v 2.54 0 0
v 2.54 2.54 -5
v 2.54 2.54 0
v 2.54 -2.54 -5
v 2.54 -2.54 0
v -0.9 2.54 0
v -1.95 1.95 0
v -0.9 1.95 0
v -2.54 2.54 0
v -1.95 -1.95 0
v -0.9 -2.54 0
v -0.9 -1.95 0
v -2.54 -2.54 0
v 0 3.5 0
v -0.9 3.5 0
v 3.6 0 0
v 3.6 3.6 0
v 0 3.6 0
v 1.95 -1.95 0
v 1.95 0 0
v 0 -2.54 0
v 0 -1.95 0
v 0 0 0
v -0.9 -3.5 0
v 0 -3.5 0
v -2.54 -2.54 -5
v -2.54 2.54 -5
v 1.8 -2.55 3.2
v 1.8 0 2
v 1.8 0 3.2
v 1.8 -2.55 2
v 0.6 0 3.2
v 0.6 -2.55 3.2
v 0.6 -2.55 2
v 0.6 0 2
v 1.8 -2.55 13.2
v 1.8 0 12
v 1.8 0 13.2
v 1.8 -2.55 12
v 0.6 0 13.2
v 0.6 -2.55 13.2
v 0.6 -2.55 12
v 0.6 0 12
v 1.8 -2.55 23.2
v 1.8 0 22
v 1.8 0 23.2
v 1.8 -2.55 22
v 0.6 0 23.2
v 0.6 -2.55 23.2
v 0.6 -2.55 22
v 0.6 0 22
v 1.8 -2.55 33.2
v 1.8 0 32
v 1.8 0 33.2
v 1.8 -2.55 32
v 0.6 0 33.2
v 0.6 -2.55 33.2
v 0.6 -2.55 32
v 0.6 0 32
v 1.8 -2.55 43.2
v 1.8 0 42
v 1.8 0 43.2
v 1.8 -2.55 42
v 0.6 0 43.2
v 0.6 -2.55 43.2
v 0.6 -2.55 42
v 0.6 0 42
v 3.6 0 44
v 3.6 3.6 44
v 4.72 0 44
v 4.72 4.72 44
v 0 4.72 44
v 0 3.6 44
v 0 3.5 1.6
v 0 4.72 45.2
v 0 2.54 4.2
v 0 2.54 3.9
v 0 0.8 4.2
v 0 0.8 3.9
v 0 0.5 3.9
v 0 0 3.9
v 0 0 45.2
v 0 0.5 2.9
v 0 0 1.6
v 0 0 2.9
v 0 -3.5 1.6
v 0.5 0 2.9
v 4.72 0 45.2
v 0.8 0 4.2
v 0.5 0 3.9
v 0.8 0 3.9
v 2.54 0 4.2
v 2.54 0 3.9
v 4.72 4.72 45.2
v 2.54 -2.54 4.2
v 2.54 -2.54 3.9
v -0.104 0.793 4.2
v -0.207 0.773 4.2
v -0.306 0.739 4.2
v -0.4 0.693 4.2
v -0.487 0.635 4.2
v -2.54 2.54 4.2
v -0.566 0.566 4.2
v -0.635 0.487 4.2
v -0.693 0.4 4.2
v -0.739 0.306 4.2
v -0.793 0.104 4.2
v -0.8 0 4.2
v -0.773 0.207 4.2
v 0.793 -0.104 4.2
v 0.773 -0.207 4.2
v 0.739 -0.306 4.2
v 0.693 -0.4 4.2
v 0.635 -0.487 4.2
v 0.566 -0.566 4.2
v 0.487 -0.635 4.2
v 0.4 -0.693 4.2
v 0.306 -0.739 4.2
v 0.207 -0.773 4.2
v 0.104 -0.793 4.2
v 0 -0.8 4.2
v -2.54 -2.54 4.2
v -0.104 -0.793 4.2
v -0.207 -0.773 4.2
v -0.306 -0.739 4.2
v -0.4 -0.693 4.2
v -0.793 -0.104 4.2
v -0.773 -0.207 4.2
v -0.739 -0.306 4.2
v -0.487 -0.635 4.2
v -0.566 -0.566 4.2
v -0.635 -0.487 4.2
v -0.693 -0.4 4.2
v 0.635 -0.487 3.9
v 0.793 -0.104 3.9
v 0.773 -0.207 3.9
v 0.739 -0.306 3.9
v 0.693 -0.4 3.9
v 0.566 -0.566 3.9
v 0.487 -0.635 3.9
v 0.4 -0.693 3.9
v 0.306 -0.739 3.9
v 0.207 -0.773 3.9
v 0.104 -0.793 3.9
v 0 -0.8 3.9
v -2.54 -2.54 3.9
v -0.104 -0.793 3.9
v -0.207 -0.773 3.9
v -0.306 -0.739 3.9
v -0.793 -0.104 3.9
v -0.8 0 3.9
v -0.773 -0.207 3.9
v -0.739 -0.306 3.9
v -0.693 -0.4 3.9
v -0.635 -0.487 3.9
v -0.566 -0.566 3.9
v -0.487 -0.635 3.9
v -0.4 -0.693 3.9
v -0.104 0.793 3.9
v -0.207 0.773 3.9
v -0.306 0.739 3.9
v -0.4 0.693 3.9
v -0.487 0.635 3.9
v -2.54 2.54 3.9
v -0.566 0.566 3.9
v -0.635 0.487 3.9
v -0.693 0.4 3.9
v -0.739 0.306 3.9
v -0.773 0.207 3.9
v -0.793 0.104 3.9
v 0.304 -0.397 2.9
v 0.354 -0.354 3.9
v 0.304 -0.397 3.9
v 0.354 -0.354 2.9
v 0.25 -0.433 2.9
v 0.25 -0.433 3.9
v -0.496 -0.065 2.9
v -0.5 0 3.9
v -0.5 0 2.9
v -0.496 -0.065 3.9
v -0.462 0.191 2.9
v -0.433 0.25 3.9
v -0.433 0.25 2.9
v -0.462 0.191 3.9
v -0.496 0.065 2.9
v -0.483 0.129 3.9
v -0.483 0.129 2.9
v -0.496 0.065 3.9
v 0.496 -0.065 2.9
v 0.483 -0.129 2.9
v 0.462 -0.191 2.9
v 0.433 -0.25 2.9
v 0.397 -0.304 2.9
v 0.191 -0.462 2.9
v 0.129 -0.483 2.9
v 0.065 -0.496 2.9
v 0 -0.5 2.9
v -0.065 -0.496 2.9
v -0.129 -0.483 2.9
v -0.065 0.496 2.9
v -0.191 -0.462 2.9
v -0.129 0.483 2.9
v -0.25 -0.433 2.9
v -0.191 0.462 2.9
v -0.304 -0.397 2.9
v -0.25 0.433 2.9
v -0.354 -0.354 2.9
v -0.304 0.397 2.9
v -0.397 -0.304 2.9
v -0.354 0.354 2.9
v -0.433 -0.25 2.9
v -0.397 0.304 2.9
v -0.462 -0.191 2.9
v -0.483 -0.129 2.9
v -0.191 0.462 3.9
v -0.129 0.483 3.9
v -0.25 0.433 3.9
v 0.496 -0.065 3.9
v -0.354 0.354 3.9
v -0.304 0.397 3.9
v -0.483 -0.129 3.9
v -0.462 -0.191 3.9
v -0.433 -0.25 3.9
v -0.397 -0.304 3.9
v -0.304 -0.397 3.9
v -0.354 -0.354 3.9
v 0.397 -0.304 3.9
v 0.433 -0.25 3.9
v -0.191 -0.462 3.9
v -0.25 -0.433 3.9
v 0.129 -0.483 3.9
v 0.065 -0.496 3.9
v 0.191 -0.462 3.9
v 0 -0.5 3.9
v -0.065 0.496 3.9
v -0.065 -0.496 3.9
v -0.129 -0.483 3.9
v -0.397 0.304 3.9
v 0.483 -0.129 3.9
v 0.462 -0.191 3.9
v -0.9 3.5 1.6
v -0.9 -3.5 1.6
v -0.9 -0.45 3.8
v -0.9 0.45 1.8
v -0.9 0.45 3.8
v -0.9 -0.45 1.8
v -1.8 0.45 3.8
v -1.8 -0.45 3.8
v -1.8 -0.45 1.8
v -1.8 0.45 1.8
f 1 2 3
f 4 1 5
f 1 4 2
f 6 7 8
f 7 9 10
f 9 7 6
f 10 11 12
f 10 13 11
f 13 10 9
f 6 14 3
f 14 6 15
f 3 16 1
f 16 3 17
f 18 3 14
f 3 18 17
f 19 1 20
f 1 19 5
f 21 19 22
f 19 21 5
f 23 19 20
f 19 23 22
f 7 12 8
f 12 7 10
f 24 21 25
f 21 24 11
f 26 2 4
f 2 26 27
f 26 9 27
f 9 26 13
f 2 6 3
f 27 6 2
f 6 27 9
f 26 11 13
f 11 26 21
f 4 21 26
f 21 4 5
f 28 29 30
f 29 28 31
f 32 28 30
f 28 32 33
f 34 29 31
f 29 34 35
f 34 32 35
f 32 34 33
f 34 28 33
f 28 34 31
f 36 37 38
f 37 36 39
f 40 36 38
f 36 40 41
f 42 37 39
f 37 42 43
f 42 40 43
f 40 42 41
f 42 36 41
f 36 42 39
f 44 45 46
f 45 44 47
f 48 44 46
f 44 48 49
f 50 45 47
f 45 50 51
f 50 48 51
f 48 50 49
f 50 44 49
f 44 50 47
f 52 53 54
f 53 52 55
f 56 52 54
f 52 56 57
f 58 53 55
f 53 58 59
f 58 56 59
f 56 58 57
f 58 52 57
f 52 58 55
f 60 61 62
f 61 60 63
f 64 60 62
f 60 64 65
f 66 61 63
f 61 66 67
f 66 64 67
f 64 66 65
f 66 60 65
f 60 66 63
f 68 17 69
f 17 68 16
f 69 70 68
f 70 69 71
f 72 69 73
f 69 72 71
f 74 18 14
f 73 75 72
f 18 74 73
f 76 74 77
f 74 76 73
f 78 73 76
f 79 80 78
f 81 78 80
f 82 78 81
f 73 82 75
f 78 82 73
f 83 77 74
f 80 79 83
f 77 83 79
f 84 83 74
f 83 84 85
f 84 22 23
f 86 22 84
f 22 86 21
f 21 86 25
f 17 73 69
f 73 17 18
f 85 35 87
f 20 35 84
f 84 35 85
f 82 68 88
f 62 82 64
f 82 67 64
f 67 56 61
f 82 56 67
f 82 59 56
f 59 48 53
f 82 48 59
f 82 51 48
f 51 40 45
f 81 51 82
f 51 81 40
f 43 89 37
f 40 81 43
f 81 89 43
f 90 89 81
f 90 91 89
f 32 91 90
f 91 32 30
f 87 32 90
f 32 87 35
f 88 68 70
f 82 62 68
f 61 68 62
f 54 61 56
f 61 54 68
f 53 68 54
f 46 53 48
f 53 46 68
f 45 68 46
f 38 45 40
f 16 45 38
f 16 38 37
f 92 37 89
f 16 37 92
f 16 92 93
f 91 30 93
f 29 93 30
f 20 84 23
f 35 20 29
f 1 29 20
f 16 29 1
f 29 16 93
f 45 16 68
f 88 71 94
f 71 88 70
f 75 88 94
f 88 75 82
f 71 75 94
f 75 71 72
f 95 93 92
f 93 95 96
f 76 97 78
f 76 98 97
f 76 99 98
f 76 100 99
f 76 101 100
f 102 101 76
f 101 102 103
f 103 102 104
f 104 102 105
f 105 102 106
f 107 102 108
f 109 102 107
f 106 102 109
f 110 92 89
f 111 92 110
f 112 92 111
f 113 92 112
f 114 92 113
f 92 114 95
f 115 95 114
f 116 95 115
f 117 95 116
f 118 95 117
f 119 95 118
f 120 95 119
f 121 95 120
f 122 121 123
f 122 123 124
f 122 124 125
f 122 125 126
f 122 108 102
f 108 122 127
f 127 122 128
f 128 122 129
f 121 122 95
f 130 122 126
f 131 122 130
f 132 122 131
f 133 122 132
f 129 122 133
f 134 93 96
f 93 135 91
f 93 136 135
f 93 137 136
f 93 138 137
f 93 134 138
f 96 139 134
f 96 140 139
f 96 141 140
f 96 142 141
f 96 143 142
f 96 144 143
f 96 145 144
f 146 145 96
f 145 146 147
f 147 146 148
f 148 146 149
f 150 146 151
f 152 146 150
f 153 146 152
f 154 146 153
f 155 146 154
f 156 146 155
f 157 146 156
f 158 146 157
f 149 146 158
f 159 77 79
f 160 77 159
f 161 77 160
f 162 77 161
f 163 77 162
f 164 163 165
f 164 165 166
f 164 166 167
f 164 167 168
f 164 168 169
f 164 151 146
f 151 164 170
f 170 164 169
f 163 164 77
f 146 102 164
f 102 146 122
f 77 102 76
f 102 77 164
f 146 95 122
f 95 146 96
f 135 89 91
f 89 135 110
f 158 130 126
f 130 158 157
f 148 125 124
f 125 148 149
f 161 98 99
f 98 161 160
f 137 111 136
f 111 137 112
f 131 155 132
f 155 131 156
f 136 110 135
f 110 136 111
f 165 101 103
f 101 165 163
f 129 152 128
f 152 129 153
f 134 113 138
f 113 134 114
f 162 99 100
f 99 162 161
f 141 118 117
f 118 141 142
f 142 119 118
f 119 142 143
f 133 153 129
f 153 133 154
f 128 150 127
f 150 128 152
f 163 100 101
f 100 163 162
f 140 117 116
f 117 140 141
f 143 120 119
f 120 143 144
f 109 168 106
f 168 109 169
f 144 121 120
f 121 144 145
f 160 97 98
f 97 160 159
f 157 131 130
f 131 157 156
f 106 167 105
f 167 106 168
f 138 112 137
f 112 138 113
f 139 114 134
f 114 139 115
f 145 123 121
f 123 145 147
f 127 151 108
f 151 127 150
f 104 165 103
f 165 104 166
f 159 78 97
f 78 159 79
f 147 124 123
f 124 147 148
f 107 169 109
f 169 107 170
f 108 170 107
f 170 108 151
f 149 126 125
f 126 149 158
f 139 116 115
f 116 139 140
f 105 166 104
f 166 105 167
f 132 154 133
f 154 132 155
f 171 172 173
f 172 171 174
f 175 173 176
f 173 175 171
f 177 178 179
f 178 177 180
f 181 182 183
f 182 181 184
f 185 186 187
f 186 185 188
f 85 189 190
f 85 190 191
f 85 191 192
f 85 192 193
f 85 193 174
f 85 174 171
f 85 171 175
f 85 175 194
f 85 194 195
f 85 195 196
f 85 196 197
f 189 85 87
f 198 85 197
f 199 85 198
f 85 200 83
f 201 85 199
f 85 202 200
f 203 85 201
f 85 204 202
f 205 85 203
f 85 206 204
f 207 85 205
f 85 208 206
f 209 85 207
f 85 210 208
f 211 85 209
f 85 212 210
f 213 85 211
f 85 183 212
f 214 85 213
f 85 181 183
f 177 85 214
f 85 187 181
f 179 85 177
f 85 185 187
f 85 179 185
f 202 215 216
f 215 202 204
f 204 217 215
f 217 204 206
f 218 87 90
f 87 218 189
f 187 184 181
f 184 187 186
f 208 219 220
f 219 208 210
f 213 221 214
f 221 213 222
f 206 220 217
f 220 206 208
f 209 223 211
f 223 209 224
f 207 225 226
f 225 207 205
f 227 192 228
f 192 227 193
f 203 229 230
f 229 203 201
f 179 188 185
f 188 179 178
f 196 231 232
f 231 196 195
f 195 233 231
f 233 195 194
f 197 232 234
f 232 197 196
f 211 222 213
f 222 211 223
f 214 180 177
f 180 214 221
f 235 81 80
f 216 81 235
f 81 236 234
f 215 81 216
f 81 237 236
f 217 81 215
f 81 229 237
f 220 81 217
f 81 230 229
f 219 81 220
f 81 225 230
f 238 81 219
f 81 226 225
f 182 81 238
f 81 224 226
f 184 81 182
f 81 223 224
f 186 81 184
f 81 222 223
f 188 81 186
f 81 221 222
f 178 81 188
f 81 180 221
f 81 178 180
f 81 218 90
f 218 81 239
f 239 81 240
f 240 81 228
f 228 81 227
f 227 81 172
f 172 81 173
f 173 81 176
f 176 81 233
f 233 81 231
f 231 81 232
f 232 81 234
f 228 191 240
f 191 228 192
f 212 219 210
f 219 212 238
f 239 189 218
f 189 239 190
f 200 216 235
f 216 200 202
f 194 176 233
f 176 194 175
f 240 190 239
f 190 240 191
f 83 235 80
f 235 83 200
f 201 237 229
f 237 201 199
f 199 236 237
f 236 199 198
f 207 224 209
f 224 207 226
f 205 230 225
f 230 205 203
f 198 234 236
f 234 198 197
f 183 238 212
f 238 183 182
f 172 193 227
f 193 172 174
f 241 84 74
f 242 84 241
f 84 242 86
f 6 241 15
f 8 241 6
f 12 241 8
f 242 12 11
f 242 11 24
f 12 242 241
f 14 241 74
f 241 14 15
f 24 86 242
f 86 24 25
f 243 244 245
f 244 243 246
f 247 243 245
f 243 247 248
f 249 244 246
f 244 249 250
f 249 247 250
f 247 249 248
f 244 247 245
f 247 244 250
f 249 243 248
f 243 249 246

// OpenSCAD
// DND-75 A2 / A3 divergent machines -- punched-media true-pitch cell CAD.
//
// A2 (hand-crank + punched-tape reader) and A3 (S1-B banked broadcast ratchet +
// punched-film threshold planes) share ONE new geometric claim that must be
// witnessed at the real 5.08 mm pitch: a punched MEDIA bit (a hole in a thin
// film/tape) must be able to open or block a printed gate beside a 4.72 mm
// column, with printable walls, and a follower must pass the hole.
//
// This file models that media cell: the column + 5-pocket rack, the printed
// gate bar, and the punched film with its hole and its boss (the A2 read-comb
// follower or the A3 threshold-plane boss). It is the pitch-budget witness for
// the whole punched-media family, deliberately kept to the S5 column so the
// only NEW parts are the film plane and the gate.
//
// EVIDENCE CLASS: CAD (this file + its STL render). Not a print, not a
// measurement. See 07-evidence-and-decisions/dnd75-divergent-low-cost.md.
// Units: mm. Target process: Bambu X1C, PLA, 0.4 mm nozzle.

PITCH = 5.08;
LEVELS = 5;
TRAVEL = 40.0;

// unchanged visible column (test11 S1 coupon conventions)
COLUMN_CAP = 4.72;
COLUMN_BODY = 3.60;
RACK_PITCH = 10.0;
RACK_POCKETS = 5;
POCKET_DEPTH = 1.20;
POCKET_WIDTH = 2.40;

// printed gate bar (S1 coupon geometry: stacked ABOVE the pawl in Z).
// DND-75 hostile fix: the test11 S1 coupon used 0.80 mm leaves, which sit
// between the 1-line floor (0.44) and the 2-line robustness target (0.88).
// A2/A3 re-profile both to 0.90 mm (2 lines) so the printed leaves PASS.
PAWL_T = 0.90;
PAWL_W = 7.00;
PAWL_L = 1.60;
GATE_BAR_T = 0.90;
GATE_TRAVEL = 1.40;

// punched media
FILM_T = 0.30;                  // punched film/tape thickness (1 line = 0.44;
                                // declared 0.30 is BELOW the floor -> the
                                // validator must flag it RISK, which is the
                                // honest A2/A3 media risk to record)
HOLE_D = 1.60;                  // media hole diameter
BOSS_D = 1.00;                  // film boss over an armed cell
MEDIA_W = PITCH;

// printed guide sleeves / housing
WALL = 0.90;
BASE = 3.00;
MIN_FDM_WALL = 0.44;

$fn = 48;
EPS = 0.01;

module column() {
    // necked body + square visible cap
    translate([0, 0, 0]) cube([COLUMN_BODY, COLUMN_BODY, TRAVEL + 4.0], center = false);
    translate([0, 0, TRAVEL + 4.0])
        cube([COLUMN_CAP, COLUMN_CAP, 1.2], center = false);
    // 5-pocket rack on one face
    for (k = [0:RACK_POCKETS - 1])
        translate([COLUMN_BODY / 2 - POCKET_DEPTH, -PITCH / 2 - EPS,
                   k * RACK_PITCH + 2.0])
            cube([POCKET_DEPTH, PITCH + 2 * EPS, 1.2]);
}

module pawl() {
    // flat cantilever rooted on the frame, wedge toe into a rack pocket
    translate([-PAWL_T, -PAWL_W / 2, 0]) cube([PAWL_T, PAWL_W, PAWL_L]);
}

module gate_bar() {
    // vertical gate bar, stacked above the pawl in the same X/Y lane
    translate([-PAWL_T - GATE_BAR_T, -GATE_BAR_T / 2, PAWL_L + 0.2])
        cube([GATE_BAR_T, GATE_BAR_T, 2.0]);
}

module punched_film() {
    // the media plane with one hole and one boss (armed cell)
    difference() {
        translate([-MEDIA_W / 2, -MEDIA_W / 2, -FILM_T])
            cube([MEDIA_W, MEDIA_W, FILM_T]);
        translate([0, 0, -FILM_T - EPS]) cylinder(r = HOLE_D / 2, h = FILM_T + 2 * EPS);
    }
    translate([0, 0, -FILM_T - BOSS_D / 2])
        cylinder(r = BOSS_D / 2, h = BOSS_D, center = true);
}

module frame() {
    difference() {
        translate([-PITCH / 2, -PITCH / 2, -BASE - 2.0])
            cube([PITCH, PITCH, BASE + 2.0]);
        translate([-COLUMN_BODY / 2 - 0.15, -COLUMN_BODY / 2 - 0.15, 0])
            cube([COLUMN_BODY + 0.30, COLUMN_BODY + 0.30, TRAVEL + 6.0], center = false);
    }
}

module media_cell_assembly() {
    frame();
    column();
    pawl();
    gate_bar();
    translate([0, 0, PAWL_L + 2.6]) punched_film();
}

// The 5x3 true-pitch coupon witness: 5 columns x 3 rows at 5.08 mm.
module coupon_witness() {
    for (i = [0:4]) for (j = [0:2])
        translate([i * PITCH, j * PITCH, 0]) media_cell_assembly();
}

part = "assembly";

if (part == "assembly") {
    media_cell_assembly();
} else if (part == "coupon") {
    coupon_witness();
} else if (part == "column") {
    column();
} else if (part == "pawl") {
    pawl();
} else if (part == "gate") {
    gate_bar();
} else if (part == "film") {
    punched_film();
}
